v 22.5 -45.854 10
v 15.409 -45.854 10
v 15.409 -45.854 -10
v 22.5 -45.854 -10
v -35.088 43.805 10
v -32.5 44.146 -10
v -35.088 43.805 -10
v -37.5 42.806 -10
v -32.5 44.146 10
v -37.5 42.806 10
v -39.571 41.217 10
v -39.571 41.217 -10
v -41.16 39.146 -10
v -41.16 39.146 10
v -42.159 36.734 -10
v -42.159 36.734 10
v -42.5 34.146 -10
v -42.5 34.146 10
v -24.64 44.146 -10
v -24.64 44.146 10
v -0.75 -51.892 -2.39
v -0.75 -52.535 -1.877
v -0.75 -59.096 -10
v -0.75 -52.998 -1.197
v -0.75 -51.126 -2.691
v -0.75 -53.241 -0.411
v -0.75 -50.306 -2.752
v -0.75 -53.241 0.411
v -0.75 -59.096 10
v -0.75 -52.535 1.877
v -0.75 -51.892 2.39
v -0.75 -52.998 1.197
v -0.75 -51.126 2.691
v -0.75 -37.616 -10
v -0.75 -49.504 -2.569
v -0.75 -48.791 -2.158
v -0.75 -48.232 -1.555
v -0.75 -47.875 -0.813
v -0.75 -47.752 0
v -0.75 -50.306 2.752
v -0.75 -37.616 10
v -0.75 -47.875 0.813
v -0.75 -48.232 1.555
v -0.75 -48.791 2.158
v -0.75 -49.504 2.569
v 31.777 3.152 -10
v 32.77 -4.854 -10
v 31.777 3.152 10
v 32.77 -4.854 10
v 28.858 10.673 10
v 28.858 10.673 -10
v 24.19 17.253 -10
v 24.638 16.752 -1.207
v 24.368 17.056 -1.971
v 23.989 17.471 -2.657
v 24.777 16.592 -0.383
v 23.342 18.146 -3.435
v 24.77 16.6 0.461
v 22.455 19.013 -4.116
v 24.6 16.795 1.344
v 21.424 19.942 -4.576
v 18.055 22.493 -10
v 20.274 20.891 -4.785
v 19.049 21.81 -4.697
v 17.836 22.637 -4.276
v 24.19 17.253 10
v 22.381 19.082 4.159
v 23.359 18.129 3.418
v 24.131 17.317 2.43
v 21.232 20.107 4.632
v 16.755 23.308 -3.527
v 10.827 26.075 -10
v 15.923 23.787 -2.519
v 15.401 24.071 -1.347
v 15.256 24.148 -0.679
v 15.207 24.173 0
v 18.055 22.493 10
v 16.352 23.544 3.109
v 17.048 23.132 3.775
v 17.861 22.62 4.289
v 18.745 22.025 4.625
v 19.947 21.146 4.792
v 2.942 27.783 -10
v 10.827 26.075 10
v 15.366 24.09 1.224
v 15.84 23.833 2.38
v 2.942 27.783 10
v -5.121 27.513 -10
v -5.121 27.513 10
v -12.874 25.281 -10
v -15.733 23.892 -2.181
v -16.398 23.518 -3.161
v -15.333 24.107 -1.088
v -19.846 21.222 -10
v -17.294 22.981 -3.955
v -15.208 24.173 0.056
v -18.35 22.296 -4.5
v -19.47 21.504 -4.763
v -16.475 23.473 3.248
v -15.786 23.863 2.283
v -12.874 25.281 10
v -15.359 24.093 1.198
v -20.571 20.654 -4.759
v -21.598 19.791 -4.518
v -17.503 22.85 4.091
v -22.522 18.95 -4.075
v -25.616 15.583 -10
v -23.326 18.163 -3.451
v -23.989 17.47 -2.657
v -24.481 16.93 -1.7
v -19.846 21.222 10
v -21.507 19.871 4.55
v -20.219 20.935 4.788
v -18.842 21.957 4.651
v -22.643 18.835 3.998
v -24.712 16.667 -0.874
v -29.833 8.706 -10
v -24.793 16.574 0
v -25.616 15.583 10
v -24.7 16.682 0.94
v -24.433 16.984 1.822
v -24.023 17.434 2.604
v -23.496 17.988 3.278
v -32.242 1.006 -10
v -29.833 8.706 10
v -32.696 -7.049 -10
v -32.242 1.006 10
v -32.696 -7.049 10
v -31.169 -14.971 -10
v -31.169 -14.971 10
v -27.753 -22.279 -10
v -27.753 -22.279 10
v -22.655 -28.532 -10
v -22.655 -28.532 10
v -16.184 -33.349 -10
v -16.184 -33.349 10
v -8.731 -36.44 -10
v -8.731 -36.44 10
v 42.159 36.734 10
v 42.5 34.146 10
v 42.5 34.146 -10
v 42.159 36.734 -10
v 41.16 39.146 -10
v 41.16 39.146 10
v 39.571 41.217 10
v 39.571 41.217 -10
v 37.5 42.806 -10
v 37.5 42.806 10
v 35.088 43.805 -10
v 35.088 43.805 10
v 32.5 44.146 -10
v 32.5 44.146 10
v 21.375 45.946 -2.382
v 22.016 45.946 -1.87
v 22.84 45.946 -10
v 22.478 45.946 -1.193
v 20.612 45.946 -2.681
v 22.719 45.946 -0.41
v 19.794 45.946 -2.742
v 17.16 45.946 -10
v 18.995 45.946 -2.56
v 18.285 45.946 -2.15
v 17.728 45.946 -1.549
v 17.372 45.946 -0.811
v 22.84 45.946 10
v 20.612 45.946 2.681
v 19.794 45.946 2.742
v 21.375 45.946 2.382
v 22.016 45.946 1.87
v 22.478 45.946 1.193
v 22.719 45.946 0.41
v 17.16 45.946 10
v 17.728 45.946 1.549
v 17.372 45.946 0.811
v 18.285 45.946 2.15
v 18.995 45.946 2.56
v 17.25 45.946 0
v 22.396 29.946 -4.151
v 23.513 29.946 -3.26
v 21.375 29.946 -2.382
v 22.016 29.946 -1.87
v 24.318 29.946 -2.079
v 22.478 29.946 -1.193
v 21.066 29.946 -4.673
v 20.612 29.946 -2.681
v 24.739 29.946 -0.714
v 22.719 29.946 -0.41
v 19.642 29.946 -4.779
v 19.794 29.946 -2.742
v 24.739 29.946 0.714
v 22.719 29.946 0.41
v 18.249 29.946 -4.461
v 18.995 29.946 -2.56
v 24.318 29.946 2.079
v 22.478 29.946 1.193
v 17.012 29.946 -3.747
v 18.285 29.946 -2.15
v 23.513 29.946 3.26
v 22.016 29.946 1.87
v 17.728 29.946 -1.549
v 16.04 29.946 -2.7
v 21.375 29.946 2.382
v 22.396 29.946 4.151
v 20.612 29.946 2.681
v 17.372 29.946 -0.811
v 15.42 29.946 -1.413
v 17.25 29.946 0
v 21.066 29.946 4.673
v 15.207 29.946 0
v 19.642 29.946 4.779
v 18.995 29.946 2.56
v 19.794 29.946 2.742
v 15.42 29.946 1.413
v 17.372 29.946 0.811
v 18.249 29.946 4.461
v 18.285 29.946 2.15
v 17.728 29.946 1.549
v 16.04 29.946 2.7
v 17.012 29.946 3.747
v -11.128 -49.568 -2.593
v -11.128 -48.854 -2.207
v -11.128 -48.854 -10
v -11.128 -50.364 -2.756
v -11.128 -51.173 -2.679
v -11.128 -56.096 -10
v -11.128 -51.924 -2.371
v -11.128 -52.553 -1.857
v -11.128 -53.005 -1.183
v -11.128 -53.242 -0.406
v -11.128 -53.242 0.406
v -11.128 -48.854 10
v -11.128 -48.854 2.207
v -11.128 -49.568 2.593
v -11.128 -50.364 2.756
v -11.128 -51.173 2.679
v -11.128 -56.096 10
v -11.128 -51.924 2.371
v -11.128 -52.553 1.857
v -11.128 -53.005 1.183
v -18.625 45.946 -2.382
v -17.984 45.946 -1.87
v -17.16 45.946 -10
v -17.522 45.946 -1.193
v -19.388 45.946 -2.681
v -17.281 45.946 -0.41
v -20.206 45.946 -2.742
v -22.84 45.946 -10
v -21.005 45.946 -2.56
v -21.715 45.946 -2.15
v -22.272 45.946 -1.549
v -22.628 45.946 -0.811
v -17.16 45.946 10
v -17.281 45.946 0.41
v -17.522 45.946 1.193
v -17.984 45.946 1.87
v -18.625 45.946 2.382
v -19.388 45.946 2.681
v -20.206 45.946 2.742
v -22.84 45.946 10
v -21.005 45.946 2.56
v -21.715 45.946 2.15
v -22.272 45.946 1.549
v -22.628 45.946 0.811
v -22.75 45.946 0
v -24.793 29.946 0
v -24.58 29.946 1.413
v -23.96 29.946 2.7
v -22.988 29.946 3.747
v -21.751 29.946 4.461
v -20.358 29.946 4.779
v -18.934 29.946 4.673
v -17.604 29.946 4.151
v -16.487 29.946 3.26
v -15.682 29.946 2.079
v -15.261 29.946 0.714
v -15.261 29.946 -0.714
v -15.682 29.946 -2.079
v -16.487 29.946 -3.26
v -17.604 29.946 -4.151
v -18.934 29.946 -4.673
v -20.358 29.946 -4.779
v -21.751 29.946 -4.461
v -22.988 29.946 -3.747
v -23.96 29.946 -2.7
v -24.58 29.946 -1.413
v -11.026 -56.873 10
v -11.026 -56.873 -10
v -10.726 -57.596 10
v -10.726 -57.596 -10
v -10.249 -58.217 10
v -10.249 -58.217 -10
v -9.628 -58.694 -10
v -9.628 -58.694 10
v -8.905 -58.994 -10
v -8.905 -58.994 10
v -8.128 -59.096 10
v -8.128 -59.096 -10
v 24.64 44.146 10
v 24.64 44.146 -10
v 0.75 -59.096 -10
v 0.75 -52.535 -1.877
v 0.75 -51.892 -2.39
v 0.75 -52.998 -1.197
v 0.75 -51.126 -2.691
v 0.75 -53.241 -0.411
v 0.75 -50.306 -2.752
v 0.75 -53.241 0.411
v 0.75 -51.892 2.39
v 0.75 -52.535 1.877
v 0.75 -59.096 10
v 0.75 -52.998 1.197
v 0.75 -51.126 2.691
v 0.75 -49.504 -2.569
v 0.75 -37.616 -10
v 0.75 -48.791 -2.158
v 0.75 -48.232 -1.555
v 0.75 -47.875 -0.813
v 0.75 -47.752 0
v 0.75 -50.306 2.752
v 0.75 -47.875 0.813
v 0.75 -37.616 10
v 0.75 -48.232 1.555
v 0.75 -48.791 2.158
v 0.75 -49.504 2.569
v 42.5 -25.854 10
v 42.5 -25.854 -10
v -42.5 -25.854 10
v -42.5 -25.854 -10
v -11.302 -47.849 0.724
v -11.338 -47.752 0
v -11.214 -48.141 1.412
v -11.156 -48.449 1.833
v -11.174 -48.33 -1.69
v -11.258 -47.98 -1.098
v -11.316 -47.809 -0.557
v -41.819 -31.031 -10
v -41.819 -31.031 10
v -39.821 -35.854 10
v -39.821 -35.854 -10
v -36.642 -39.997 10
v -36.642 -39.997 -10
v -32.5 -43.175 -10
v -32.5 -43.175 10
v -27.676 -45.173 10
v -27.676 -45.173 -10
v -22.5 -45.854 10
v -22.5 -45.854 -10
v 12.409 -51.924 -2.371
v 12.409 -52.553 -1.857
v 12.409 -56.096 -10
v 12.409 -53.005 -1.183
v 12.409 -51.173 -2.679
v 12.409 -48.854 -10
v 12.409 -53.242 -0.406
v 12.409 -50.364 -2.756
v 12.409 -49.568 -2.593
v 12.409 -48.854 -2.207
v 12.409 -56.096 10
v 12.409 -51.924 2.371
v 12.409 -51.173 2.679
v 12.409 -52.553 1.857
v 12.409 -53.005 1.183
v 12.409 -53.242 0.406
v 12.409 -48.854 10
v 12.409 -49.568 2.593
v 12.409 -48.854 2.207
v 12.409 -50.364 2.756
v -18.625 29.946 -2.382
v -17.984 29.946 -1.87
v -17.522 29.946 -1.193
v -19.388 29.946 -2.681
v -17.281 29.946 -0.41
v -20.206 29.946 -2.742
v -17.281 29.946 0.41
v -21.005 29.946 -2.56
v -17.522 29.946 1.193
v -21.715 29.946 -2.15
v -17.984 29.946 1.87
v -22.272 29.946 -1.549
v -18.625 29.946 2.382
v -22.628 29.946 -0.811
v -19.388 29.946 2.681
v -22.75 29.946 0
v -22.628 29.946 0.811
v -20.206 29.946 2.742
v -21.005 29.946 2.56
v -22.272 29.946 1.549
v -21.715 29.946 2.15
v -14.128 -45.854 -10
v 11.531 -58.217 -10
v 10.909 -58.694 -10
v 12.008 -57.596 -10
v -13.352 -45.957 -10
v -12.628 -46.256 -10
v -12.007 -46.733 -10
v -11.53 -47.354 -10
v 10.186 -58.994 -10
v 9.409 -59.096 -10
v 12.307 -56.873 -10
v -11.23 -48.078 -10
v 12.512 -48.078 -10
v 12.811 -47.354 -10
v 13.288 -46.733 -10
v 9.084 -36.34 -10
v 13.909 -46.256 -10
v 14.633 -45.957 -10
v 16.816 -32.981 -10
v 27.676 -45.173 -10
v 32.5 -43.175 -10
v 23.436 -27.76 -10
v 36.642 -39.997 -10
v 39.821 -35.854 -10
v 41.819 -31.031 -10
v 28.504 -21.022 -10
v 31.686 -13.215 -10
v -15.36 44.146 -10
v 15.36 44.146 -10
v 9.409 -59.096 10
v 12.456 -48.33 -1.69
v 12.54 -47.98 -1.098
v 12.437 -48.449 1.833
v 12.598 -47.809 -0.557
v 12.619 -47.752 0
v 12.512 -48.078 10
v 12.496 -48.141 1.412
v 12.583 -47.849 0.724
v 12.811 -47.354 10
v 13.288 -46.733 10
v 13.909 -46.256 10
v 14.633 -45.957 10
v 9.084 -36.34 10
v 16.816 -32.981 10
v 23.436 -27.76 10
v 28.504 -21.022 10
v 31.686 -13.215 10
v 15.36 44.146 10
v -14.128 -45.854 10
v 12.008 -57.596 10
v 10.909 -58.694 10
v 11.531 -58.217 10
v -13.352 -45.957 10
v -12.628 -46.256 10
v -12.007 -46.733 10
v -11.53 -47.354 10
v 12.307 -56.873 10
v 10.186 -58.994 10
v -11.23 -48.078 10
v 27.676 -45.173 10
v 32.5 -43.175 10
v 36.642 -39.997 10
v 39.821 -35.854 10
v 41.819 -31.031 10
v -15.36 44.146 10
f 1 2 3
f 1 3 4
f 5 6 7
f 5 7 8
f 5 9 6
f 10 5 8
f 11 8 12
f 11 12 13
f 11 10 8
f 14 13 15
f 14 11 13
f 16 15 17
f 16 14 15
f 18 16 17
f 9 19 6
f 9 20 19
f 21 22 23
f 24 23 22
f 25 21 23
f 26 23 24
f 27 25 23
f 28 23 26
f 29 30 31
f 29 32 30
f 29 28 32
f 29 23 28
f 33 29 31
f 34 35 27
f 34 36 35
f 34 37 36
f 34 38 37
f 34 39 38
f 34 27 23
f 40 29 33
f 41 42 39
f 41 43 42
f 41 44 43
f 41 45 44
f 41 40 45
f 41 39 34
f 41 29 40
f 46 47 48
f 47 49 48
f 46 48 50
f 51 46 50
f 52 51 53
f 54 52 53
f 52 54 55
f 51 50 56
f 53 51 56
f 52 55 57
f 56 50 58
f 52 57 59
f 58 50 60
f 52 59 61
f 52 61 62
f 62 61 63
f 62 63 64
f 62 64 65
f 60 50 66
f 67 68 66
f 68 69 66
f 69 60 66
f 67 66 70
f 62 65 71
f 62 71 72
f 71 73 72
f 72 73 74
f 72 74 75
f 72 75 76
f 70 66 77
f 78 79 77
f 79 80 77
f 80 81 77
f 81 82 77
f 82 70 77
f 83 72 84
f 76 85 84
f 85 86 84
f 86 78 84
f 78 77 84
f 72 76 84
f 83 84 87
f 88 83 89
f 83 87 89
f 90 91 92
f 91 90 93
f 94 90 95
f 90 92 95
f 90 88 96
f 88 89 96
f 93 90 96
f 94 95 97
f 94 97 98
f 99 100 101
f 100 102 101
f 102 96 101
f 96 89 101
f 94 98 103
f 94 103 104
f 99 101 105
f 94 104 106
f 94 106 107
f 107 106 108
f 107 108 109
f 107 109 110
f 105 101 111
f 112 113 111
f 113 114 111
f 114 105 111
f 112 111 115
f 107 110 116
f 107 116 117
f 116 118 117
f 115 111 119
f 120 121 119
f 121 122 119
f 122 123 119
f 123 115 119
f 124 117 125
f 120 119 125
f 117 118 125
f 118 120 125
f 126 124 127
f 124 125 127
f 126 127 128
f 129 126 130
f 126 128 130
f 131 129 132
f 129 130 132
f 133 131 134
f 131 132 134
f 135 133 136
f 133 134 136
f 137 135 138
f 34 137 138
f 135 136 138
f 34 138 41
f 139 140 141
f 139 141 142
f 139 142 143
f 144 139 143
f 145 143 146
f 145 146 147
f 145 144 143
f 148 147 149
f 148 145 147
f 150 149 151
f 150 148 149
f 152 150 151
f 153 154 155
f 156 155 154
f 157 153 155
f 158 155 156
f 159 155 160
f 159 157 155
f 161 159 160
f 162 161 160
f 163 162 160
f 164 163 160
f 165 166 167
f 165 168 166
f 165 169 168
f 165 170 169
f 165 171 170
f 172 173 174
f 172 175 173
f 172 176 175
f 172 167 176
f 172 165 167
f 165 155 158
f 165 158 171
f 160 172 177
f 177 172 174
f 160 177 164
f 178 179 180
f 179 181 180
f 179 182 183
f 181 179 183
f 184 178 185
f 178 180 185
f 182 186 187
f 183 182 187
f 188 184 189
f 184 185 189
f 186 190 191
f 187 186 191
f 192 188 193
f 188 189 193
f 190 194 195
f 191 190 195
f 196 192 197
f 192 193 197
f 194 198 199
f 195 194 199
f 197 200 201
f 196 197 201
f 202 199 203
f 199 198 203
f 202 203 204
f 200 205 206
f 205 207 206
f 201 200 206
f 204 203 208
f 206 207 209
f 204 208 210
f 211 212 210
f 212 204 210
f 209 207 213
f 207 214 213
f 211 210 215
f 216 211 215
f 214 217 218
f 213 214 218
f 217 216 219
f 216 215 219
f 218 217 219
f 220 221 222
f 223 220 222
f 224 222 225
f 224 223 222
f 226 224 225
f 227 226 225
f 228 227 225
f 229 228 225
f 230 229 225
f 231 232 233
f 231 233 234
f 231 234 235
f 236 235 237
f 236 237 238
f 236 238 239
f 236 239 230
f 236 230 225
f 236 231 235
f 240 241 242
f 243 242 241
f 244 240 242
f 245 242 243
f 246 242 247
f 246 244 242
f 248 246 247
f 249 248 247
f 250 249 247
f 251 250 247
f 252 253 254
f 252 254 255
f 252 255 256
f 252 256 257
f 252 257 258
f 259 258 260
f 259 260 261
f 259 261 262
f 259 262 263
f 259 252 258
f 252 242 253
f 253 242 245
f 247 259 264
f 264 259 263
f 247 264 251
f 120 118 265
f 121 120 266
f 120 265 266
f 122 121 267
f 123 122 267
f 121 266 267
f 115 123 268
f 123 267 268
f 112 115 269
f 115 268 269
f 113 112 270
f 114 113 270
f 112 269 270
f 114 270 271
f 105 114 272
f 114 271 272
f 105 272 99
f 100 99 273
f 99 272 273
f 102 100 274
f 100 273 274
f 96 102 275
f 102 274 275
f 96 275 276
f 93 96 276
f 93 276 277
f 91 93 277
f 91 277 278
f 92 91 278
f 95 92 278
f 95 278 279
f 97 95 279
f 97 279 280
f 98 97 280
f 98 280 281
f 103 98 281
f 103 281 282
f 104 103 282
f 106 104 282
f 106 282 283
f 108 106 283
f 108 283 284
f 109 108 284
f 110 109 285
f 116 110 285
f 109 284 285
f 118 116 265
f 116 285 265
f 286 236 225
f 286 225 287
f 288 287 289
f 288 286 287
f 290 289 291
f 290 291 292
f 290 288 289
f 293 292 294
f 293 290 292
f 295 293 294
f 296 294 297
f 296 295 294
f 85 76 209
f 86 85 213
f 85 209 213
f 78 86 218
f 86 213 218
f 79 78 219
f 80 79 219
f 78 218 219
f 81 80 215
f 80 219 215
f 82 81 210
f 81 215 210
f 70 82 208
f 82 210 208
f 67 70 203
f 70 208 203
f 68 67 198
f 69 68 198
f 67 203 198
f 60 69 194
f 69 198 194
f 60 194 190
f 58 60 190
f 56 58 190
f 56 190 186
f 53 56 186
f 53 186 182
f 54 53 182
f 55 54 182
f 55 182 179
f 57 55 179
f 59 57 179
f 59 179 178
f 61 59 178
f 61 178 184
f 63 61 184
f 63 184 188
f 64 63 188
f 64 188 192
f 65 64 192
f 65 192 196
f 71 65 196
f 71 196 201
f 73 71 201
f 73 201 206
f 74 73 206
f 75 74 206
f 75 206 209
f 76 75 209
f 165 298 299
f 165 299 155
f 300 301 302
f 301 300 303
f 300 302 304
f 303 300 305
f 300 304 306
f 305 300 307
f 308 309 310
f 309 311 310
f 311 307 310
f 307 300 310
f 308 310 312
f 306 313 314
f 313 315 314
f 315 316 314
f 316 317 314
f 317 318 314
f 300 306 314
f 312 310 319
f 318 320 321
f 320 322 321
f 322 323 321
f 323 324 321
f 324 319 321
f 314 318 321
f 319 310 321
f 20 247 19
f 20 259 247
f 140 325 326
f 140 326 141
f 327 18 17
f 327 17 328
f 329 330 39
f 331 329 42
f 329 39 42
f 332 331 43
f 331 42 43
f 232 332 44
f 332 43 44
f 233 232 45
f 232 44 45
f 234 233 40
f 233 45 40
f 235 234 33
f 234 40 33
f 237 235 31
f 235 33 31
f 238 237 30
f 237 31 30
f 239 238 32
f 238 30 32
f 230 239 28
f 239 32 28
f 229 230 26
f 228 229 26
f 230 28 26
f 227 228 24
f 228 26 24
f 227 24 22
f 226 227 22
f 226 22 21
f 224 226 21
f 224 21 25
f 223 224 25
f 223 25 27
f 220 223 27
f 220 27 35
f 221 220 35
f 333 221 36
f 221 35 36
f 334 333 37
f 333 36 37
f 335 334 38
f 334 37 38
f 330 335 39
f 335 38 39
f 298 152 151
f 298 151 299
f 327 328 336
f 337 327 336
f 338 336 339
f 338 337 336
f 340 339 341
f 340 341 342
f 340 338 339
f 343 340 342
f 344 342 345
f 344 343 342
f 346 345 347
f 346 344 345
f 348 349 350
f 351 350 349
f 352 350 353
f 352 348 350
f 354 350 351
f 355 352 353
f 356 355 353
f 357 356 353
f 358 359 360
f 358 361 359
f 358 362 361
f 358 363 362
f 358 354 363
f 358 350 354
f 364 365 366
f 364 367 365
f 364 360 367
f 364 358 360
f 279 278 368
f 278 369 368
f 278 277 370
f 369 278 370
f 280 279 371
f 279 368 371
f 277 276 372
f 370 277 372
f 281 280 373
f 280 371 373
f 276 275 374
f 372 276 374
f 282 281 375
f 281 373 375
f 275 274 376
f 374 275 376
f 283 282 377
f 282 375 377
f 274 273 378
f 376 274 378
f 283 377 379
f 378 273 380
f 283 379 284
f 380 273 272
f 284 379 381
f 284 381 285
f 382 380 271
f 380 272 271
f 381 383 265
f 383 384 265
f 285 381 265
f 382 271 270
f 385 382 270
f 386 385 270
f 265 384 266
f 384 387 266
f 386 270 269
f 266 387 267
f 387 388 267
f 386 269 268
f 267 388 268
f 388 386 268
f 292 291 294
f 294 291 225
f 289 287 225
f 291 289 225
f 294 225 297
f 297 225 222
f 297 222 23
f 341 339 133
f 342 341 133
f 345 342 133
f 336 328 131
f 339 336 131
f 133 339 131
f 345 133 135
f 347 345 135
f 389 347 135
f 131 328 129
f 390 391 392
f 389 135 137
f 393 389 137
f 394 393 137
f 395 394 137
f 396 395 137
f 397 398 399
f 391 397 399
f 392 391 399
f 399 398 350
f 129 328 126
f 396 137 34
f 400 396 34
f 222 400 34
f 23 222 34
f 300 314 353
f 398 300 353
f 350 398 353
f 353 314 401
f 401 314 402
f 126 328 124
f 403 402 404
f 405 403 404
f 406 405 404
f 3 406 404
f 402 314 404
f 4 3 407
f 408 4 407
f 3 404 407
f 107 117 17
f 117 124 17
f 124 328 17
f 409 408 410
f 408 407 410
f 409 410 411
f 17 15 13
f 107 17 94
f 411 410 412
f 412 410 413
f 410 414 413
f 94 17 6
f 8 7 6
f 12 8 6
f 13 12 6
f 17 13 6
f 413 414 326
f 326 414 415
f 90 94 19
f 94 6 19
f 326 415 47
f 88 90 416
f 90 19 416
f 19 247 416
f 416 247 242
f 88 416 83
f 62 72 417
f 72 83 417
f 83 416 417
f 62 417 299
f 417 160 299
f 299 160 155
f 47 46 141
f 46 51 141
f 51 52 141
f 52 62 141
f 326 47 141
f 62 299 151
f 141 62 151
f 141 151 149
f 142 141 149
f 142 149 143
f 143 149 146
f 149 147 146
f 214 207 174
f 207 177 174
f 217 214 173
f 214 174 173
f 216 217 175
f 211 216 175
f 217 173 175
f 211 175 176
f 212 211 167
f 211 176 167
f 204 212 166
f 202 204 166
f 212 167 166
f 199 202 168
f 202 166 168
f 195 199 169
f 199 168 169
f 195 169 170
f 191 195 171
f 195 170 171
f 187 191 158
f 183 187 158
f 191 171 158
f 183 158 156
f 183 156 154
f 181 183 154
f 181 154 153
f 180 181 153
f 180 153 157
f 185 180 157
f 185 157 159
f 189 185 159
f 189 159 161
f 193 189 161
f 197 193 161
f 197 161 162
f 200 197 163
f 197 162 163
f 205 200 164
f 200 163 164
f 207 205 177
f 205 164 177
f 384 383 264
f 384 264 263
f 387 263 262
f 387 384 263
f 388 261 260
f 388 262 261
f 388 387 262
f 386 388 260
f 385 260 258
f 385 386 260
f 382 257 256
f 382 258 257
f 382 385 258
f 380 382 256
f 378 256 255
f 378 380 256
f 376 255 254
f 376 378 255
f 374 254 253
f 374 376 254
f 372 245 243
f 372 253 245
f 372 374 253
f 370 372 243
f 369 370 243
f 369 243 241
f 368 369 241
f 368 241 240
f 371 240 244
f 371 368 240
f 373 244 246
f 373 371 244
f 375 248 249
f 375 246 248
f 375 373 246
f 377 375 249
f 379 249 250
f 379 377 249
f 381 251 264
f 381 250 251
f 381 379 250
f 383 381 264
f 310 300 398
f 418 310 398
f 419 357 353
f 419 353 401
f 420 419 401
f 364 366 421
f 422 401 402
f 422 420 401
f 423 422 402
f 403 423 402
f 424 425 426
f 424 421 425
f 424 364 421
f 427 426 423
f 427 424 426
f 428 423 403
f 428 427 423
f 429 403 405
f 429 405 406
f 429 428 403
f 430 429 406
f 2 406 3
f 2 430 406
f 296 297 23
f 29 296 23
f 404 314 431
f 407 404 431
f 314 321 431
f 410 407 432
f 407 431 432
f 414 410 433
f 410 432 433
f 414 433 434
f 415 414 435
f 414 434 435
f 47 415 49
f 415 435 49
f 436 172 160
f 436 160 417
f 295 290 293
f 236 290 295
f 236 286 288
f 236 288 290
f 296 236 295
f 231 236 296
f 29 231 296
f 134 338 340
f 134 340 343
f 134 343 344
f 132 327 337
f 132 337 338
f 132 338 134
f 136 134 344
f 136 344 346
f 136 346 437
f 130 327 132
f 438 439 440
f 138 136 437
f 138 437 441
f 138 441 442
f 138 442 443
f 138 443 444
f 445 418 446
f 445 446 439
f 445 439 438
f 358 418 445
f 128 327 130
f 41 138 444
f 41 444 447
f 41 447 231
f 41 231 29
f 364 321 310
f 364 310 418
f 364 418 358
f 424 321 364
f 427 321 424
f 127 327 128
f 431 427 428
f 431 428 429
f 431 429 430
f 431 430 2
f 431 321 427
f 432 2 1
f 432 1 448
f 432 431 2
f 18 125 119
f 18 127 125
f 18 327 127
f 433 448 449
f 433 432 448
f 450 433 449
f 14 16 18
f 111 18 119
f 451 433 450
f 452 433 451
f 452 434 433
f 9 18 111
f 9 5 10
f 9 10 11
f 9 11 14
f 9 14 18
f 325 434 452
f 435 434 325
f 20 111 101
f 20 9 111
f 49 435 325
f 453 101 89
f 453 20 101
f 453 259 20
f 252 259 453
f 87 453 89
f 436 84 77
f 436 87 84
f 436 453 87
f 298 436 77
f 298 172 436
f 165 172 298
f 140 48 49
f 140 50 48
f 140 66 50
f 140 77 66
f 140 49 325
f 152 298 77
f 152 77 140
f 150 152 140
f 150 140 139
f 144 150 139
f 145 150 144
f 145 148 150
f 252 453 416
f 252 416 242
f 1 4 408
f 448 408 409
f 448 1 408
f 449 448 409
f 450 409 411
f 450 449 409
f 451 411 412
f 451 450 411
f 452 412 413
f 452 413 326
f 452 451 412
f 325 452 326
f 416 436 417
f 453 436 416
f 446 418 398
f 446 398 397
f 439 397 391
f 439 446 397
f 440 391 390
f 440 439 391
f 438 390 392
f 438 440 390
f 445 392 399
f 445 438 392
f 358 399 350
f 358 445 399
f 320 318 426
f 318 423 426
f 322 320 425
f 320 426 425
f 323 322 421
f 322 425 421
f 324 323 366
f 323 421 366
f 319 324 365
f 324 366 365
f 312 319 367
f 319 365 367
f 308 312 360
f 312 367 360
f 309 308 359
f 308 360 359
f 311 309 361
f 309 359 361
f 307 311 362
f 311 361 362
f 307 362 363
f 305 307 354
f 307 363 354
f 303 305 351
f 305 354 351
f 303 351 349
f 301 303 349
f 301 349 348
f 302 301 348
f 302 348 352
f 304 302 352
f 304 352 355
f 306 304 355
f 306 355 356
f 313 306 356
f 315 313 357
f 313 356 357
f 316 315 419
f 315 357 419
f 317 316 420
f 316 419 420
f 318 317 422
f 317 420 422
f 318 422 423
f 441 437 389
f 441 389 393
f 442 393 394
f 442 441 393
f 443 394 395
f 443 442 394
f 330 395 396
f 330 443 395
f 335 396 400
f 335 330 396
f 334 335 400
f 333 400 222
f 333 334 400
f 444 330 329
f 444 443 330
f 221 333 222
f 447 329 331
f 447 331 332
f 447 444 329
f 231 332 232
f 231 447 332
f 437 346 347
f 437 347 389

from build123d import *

# Parameters (mm, degrees)
F1_DEPTH  = 10
F2_R      = 32.77
F3_DEPTH  = 10
F4_W      = 0.75
F4_H      = 80
F5_DEPTH  = 10
F6_R      = 2.7597283283
F7_DEPTH  = 25
F8_R      = 2.75
F9_DEPTH  = 17.9
F11_START = -14.2
F10_R     = 4.7926746231
F11_DEPTH = 15.7


with BuildPart() as f1:
    # F0 (on Top) → F1 (new body, symmetric)
    with BuildSketch(Plane.XY):
        with BuildLine():
            Line((-24.64, 44.1455395274), (-32.5, 44.1455395274))
            ThreePointArc((-32.5, 44.1455395274), (-39.5710678119, 41.2166073393), (-42.5, 34.1455395274))
            Line((-42.5, 34.1455395274), (-42.5, 0))
            Line((-42.5, 0), (-42.5, -25.8544604726))
            ThreePointArc((-42.5, -25.8544604726), (-36.6421356237, -39.9965960963), (-22.5, -45.8544604726))
            Line((-22.5, -45.8544604726), (-14.1281768916, -45.8544604726))
            ThreePointArc((-14.1281768916, -45.8544604726), (-12.0068565481, -46.733140129), (-11.1281768916, -48.8544604726))
            Line((-11.1281768916, -48.8544604726), (-11.1281768916, -56.0960675753))
            ThreePointArc((-11.1281768916, -56.0960675753), (-10.2494972352, -58.2173879188), (-8.1281768916, -59.0960675753))
            Line((-8.1281768916, -59.0960675753), (9.4094926704, -59.0960675753))
            ThreePointArc((9.4094926704, -59.0960675753), (11.530813014, -58.2173879188), (12.4094926704, -56.0960675753))
            Line((12.4094926704, -56.0960675753), (12.4094926704, -48.8544604726))
            ThreePointArc((12.4094926704, -48.8544604726), (13.2881723269, -46.733140129), (15.4094926704, -45.8544604726))
            Line((15.4094926704, -45.8544604726), (22.5, -45.8544604726))
            ThreePointArc((22.5, -45.8544604726), (36.6421356237, -39.9965960963), (42.5, -25.8544604726))
            Line((42.5, -25.8544604726), (42.5, 0))
            Line((42.5, 0), (42.5, 34.1455395274))
            ThreePointArc((42.5, 34.1455395274), (39.5710678119, 41.2166073393), (32.5, 44.1455395274))
            Line((32.5, 44.1455395274), (24.64, 44.1455395274))
            Line((24.64, 44.1455395274), (15.36, 44.1455395274))
            Line((15.36, 44.1455395274), (0, 44.1455395274))
            Line((0, 44.1455395274), (-15.36, 44.1455395274))
            Line((-15.36, 44.1455395274), (-20, 44.1455395274))
            Line((-20, 44.1455395274), (-24.64, 44.1455395274))
        make_face()
        Polygon((-22.84, 45.9455395274), (-24.64, 44.1455395274), (-20, 44.1455395274), (-20, 45.9455395274), align=None)
        Polygon((-20, 45.9455395274), (-20, 44.1455395274), (-15.36, 44.1455395274), (-17.16, 45.9455395274), align=None)
        Polygon((17.16, 45.9455395274), (15.36, 44.1455395274), (24.64, 44.1455395274), (22.84, 45.9455395274), (20, 45.9455395274), align=None)
    extrude(amount=F1_DEPTH, both=True)

    # F2 (on Top) → F3 (cut, symmetric)
    with BuildSketch(Plane.XY):
        with Locations((0, -4.8544604726)):
            Circle(F2_R)
    extrude(amount=F3_DEPTH, both=True, mode=Mode.SUBTRACT)

    # F4 (on Top) → F5 (cut, symmetric)
    with BuildSketch(Plane.XY):
        with Locations((0.375, -40)):
            Rectangle(F4_W, F4_H)
        with Locations((-0.375, -40)):
            Rectangle(F4_W, F4_H)
    extrude(amount=F5_DEPTH, both=True, mode=Mode.SUBTRACT)

    # F6 (on Right) → F7 (cut, symmetric)
    with BuildSketch(Plane.YZ):
        with Locations((-50.511858446, 0)):
            Circle(F6_R)
    extrude(amount=F7_DEPTH, both=True, mode=Mode.SUBTRACT)

    # F8 (on face) → F9 (cut, symmetric)
    with BuildSketch(Plane(origin=(0, 44.1455395274, 0), x_dir=(-1, 0, 0), z_dir=(0, 1, 0))):
        with Locations((20, 0)):
            Circle(F8_R)
        with Locations((-20, 0)):
            Circle(F8_R)
    extrude(amount=F9_DEPTH, both=True, mode=Mode.SUBTRACT)

    # F10 (on face) → F11 (cut)
    with BuildSketch(Plane(origin=(0, 44.1455395274, 0), x_dir=(-1, 0, 0), z_dir=(0, 1, 0)).offset(F11_START)):
        with Locations((20, 0)):
            Circle(F10_R)
        with Locations((-20, 0)):
            Circle(F10_R)
    extrude(amount=-F11_DEPTH, mode=Mode.SUBTRACT)


solid = f1.part
